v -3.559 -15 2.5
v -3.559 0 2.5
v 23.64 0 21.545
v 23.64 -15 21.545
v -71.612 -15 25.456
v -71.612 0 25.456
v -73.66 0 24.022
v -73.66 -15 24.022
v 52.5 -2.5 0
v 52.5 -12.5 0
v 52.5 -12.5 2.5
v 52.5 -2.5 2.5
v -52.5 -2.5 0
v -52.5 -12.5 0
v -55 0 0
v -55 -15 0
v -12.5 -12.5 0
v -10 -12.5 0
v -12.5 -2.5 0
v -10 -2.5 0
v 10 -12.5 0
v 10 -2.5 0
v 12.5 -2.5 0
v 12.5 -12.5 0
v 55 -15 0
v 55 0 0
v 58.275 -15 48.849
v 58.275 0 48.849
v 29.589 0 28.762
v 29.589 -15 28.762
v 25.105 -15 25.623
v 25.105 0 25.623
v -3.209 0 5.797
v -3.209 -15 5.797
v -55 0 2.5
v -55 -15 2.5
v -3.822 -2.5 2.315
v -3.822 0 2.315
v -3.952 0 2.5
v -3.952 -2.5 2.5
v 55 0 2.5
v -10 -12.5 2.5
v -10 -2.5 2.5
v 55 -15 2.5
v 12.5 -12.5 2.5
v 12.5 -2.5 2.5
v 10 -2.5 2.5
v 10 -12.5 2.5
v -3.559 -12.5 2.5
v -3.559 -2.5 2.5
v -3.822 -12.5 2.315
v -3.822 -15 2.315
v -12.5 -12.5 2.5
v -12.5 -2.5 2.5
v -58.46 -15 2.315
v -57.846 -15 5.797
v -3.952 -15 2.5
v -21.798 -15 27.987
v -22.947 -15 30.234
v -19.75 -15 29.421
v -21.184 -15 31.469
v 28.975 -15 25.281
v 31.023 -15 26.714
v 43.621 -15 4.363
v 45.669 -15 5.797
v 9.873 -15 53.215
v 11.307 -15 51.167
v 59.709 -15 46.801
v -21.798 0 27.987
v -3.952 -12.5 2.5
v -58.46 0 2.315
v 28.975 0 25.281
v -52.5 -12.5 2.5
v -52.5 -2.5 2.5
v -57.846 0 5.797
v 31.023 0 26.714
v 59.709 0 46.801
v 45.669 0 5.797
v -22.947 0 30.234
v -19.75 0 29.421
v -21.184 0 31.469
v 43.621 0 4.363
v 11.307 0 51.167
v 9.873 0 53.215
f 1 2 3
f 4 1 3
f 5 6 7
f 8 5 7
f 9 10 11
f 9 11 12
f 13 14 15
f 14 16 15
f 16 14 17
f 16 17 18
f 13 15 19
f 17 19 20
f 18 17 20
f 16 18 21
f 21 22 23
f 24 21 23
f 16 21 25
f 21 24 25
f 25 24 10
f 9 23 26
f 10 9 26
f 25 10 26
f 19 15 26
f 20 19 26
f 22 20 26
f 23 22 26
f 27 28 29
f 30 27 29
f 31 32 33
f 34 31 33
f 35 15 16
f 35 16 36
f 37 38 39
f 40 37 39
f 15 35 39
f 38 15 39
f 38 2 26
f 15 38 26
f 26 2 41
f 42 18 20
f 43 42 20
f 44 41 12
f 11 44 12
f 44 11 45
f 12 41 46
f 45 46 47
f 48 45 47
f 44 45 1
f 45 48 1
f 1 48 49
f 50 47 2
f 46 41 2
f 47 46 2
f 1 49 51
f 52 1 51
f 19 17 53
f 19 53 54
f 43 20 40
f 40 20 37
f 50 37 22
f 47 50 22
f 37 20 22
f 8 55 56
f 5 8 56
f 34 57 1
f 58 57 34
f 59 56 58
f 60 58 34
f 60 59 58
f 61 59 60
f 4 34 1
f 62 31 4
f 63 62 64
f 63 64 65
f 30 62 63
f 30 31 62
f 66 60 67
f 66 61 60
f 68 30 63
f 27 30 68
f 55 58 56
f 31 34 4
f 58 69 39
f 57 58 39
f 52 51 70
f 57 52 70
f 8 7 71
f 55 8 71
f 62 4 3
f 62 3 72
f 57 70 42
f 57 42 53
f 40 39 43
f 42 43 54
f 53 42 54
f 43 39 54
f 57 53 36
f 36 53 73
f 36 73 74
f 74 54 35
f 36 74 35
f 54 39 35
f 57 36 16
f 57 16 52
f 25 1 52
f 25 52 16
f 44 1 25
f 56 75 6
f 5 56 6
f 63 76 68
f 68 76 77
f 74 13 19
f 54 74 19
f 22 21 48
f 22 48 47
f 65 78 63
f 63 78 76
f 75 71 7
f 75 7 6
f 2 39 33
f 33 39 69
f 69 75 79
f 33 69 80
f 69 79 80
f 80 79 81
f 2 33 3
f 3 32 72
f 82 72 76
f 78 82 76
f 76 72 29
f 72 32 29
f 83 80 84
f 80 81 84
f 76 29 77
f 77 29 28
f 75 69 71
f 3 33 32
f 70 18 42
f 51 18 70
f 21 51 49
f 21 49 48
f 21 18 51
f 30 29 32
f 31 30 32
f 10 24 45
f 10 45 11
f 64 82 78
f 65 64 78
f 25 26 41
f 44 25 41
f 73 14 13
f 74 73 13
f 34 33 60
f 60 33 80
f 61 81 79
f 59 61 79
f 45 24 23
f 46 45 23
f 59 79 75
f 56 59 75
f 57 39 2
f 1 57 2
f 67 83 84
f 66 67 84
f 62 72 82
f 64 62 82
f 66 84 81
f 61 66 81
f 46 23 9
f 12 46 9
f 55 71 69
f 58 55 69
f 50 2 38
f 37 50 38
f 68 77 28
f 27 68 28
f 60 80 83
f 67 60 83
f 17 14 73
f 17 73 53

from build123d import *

# Parameters (mm, degrees)
F1_DEPTH = 15
F0_W     = 2.5
F0_H     = 2.5
F2_W     = 20
F2_H     = 10
F2_W_2   = 40
F3_DEPTH = 70


# Not quite as in the source:
# - a feature of the source that left no trace in its solid (it failed there, or was rolled back) is left out


with BuildPart() as f1:
    # F0 (on Front) → F1 (new body)
    with BuildSketch(Plane.XZ):
        Polygon((-28.0954666037, 23.5771734984), (-21.7977855629, 27.9868572364), (-19.7499054522, 29.4207983273), (-21.1838465431, 31.468678438), (-22.9467930342, 30.2342500155), (-57.8463816277, 5.7972950019), (-71.6116508746, 25.456136839), (-73.6595309853, 24.0221957481), (-58.4603206476, 2.3154738003), align=None)
        Polygon((-21.1838465431, 31.468678438), (-19.7499054522, 29.4207983273), (11.3069104876, 51.1670149611), (9.8729693967, 53.2148950719), align=None)
        Polygon((-21.7977855629, 27.9868572364), (-3.9516960007, 2.5), (-3.5589586403, 2.5), (23.6399283018, 21.5448656678), (28.9750478761, 25.280556611), (31.0229279868, 26.7144977018), (29.588986896, 28.7623778126), (25.1048015935, 25.6225174611), (-3.2085503448, 5.7972950019), (-19.7499054522, 29.4207983273), align=None)
        Polygon((31.0229279868, 26.7144977018), (28.9750478761, 25.280556611), (43.6214308849, 4.363353911), (45.6693109956, 5.7972950019), align=None)
        Polygon((29.588986896, 28.7623778126), (31.0229279868, 26.7144977018), (59.7092352027, 46.8008662578), (58.2752941118, 48.8487463685), align=None)
    extrude(amount=F1_DEPTH)


with BuildPart() as f1b:
    # F0 (on Front) → F1, piece 2 (new body)
    with BuildSketch(Plane.XZ):
        Polygon((-52.5, 2.5), (-52.5, 0), (52.5, 0), (52.5, 2.5), (-3.5589586403, 2.5), (-3.8224893646, 2.3154738003), (-3.9516960007, 2.5), align=None)
        with Locations((53.75, 1.25)):
            Rectangle(F0_W, F0_H)
        with Locations((-53.75, 1.25)):
            Rectangle(F0_W, F0_H)
    extrude(amount=F1_DEPTH)

    # F2 (on Top) → F3 (cut)
    with BuildSketch(Plane.XY):
        with Locations((0, -7.5)):
            Rectangle(F2_W, F2_H)
        with Locations((32.5, -7.5)):
            Rectangle(F2_W_2, F2_H)
        with Locations((-32.5, -7.5)):
            Rectangle(F2_W_2, F2_H)
    extrude(amount=F3_DEPTH, mode=Mode.SUBTRACT)


solid = Compound([f1.part, f1b.part])
